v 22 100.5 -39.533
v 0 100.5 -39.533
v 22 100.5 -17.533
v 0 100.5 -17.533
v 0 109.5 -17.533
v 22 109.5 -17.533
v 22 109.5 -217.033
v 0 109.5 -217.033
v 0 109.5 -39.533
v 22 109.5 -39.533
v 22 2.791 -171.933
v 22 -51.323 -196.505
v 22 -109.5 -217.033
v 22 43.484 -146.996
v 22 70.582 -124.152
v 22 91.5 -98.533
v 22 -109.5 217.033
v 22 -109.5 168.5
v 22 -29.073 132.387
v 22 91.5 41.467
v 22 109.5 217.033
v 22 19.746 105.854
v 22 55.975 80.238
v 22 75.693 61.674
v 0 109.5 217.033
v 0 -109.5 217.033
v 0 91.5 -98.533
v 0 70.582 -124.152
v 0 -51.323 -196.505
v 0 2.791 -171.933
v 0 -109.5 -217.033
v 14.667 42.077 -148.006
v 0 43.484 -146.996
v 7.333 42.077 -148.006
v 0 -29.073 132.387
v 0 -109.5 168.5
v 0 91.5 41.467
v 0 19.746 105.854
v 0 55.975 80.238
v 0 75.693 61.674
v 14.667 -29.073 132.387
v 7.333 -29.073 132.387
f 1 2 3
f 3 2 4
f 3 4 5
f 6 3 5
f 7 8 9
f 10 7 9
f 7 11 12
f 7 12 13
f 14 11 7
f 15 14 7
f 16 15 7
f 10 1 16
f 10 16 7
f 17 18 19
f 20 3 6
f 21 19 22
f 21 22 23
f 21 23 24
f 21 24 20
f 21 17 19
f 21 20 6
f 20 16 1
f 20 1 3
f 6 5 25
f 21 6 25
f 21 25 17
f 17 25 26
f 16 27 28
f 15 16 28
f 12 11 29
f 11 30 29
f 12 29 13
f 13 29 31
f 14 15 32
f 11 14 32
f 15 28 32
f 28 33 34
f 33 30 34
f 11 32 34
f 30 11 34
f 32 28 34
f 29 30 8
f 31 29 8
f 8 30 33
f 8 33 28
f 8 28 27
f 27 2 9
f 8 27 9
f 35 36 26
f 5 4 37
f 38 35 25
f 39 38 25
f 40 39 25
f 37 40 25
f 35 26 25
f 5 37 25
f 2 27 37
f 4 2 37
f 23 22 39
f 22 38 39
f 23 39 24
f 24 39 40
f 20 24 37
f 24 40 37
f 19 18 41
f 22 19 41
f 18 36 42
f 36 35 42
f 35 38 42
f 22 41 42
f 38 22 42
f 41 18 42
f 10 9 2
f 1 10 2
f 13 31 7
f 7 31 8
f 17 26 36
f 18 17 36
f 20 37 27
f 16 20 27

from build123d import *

# Parameters (mm, degrees)
F1_DEPTH = 22


with BuildPart() as f1:
    # F0 (on Right) → F1 (new body)
    with BuildSketch(Plane.YZ):
        with BuildLine():
            Line((109.5, -2.0528280745), (109.5, 217.0326773285))
            Line((109.5, 217.0326773285), (-109.5, 217.0326773285))
            Line((-109.5, 217.0326773285), (-109.5, 168.5))
            add(Edge.make_bspline(
                [(-109.5, 168.5), (-27.7467335676, 133.469891204), (55.4140619779, 97.2245921781), (91.5, 41.4673226715)],
                knots=[0, 0, 0, 0, 0.3625910784, 0.3625910784, 0.3625910784, 0.3625910784], degree=3))
            add(Edge.make_bspline(
                [(91.5, 41.4673226715), (100.2961758102, 27.8761352961), (106.2952978286, 13.1256022765), (109.5, -2.0528280745)],
                knots=[0.3625910784, 0.3625910784, 0.3625910784, 0.3625910784, 0.4509749489, 0.4509749489, 0.4509749489, 0.4509749489], degree=3))
        make_face()
        with BuildLine():
            Line((109.5, -17.5326773285), (109.5, -2.0528280745))
            add(Edge.make_bspline(
                [(91.5, 41.4673226715), (100.2961758102, 27.8761352961), (106.2952978286, 13.1256022765), (109.5, -2.0528280745)],
                knots=[0.3625910784, 0.3625910784, 0.3625910784, 0.3625910784, 0.4509749489, 0.4509749489, 0.4509749489, 0.4509749489], degree=3))
            Line((91.5, 41.4673226715), (91.5, -28.5326773285))
            Line((91.5, -28.5326773285), (91.5, -98.5326773285))
            add(Edge.make_bspline(
                [(109.5, -54.8776239379), (106.2942898962, -70.0854206268), (100.2934101345, -84.8814155055), (91.5, -98.5326773285)],
                knots=[0.5523720652, 0.5523720652, 0.5523720652, 0.5523720652, 0.640815625, 0.640815625, 0.640815625, 0.640815625], degree=3))
            Line((109.5, -54.8776239379), (109.5, -39.5326773285))
            Line((109.5, -39.5326773285), (100.5, -39.5326773285))
            Line((100.5, -39.5326773285), (100.5, -17.5326773285))
            Line((100.5, -17.5326773285), (109.5, -17.5326773285))
        make_face()
        with BuildLine():
            Line((109.5, -217.0326773285), (109.5, -54.8776239379))
            add(Edge.make_bspline(
                [(109.5, -54.8776239379), (106.2942898962, -70.0854206268), (100.2934101345, -84.8814155055), (91.5, -98.5326773285)],
                knots=[0.5523720652, 0.5523720652, 0.5523720652, 0.5523720652, 0.640815625, 0.640815625, 0.640815625, 0.640815625], degree=3))
            add(Edge.make_bspline(
                [(91.5, -98.5326773285), (55.7884622504, -153.9727790026), (-25.9805742583, -190.5326773285), (-109.5, -217.0326773285)],
                knots=[0.640815625, 0.640815625, 0.640815625, 0.640815625, 1, 1, 1, 1], degree=3))
            Line((-109.5, -217.0326773285), (109.5, -217.0326773285))
        make_face()
    extrude(amount=F1_DEPTH)


solid = f1.part
